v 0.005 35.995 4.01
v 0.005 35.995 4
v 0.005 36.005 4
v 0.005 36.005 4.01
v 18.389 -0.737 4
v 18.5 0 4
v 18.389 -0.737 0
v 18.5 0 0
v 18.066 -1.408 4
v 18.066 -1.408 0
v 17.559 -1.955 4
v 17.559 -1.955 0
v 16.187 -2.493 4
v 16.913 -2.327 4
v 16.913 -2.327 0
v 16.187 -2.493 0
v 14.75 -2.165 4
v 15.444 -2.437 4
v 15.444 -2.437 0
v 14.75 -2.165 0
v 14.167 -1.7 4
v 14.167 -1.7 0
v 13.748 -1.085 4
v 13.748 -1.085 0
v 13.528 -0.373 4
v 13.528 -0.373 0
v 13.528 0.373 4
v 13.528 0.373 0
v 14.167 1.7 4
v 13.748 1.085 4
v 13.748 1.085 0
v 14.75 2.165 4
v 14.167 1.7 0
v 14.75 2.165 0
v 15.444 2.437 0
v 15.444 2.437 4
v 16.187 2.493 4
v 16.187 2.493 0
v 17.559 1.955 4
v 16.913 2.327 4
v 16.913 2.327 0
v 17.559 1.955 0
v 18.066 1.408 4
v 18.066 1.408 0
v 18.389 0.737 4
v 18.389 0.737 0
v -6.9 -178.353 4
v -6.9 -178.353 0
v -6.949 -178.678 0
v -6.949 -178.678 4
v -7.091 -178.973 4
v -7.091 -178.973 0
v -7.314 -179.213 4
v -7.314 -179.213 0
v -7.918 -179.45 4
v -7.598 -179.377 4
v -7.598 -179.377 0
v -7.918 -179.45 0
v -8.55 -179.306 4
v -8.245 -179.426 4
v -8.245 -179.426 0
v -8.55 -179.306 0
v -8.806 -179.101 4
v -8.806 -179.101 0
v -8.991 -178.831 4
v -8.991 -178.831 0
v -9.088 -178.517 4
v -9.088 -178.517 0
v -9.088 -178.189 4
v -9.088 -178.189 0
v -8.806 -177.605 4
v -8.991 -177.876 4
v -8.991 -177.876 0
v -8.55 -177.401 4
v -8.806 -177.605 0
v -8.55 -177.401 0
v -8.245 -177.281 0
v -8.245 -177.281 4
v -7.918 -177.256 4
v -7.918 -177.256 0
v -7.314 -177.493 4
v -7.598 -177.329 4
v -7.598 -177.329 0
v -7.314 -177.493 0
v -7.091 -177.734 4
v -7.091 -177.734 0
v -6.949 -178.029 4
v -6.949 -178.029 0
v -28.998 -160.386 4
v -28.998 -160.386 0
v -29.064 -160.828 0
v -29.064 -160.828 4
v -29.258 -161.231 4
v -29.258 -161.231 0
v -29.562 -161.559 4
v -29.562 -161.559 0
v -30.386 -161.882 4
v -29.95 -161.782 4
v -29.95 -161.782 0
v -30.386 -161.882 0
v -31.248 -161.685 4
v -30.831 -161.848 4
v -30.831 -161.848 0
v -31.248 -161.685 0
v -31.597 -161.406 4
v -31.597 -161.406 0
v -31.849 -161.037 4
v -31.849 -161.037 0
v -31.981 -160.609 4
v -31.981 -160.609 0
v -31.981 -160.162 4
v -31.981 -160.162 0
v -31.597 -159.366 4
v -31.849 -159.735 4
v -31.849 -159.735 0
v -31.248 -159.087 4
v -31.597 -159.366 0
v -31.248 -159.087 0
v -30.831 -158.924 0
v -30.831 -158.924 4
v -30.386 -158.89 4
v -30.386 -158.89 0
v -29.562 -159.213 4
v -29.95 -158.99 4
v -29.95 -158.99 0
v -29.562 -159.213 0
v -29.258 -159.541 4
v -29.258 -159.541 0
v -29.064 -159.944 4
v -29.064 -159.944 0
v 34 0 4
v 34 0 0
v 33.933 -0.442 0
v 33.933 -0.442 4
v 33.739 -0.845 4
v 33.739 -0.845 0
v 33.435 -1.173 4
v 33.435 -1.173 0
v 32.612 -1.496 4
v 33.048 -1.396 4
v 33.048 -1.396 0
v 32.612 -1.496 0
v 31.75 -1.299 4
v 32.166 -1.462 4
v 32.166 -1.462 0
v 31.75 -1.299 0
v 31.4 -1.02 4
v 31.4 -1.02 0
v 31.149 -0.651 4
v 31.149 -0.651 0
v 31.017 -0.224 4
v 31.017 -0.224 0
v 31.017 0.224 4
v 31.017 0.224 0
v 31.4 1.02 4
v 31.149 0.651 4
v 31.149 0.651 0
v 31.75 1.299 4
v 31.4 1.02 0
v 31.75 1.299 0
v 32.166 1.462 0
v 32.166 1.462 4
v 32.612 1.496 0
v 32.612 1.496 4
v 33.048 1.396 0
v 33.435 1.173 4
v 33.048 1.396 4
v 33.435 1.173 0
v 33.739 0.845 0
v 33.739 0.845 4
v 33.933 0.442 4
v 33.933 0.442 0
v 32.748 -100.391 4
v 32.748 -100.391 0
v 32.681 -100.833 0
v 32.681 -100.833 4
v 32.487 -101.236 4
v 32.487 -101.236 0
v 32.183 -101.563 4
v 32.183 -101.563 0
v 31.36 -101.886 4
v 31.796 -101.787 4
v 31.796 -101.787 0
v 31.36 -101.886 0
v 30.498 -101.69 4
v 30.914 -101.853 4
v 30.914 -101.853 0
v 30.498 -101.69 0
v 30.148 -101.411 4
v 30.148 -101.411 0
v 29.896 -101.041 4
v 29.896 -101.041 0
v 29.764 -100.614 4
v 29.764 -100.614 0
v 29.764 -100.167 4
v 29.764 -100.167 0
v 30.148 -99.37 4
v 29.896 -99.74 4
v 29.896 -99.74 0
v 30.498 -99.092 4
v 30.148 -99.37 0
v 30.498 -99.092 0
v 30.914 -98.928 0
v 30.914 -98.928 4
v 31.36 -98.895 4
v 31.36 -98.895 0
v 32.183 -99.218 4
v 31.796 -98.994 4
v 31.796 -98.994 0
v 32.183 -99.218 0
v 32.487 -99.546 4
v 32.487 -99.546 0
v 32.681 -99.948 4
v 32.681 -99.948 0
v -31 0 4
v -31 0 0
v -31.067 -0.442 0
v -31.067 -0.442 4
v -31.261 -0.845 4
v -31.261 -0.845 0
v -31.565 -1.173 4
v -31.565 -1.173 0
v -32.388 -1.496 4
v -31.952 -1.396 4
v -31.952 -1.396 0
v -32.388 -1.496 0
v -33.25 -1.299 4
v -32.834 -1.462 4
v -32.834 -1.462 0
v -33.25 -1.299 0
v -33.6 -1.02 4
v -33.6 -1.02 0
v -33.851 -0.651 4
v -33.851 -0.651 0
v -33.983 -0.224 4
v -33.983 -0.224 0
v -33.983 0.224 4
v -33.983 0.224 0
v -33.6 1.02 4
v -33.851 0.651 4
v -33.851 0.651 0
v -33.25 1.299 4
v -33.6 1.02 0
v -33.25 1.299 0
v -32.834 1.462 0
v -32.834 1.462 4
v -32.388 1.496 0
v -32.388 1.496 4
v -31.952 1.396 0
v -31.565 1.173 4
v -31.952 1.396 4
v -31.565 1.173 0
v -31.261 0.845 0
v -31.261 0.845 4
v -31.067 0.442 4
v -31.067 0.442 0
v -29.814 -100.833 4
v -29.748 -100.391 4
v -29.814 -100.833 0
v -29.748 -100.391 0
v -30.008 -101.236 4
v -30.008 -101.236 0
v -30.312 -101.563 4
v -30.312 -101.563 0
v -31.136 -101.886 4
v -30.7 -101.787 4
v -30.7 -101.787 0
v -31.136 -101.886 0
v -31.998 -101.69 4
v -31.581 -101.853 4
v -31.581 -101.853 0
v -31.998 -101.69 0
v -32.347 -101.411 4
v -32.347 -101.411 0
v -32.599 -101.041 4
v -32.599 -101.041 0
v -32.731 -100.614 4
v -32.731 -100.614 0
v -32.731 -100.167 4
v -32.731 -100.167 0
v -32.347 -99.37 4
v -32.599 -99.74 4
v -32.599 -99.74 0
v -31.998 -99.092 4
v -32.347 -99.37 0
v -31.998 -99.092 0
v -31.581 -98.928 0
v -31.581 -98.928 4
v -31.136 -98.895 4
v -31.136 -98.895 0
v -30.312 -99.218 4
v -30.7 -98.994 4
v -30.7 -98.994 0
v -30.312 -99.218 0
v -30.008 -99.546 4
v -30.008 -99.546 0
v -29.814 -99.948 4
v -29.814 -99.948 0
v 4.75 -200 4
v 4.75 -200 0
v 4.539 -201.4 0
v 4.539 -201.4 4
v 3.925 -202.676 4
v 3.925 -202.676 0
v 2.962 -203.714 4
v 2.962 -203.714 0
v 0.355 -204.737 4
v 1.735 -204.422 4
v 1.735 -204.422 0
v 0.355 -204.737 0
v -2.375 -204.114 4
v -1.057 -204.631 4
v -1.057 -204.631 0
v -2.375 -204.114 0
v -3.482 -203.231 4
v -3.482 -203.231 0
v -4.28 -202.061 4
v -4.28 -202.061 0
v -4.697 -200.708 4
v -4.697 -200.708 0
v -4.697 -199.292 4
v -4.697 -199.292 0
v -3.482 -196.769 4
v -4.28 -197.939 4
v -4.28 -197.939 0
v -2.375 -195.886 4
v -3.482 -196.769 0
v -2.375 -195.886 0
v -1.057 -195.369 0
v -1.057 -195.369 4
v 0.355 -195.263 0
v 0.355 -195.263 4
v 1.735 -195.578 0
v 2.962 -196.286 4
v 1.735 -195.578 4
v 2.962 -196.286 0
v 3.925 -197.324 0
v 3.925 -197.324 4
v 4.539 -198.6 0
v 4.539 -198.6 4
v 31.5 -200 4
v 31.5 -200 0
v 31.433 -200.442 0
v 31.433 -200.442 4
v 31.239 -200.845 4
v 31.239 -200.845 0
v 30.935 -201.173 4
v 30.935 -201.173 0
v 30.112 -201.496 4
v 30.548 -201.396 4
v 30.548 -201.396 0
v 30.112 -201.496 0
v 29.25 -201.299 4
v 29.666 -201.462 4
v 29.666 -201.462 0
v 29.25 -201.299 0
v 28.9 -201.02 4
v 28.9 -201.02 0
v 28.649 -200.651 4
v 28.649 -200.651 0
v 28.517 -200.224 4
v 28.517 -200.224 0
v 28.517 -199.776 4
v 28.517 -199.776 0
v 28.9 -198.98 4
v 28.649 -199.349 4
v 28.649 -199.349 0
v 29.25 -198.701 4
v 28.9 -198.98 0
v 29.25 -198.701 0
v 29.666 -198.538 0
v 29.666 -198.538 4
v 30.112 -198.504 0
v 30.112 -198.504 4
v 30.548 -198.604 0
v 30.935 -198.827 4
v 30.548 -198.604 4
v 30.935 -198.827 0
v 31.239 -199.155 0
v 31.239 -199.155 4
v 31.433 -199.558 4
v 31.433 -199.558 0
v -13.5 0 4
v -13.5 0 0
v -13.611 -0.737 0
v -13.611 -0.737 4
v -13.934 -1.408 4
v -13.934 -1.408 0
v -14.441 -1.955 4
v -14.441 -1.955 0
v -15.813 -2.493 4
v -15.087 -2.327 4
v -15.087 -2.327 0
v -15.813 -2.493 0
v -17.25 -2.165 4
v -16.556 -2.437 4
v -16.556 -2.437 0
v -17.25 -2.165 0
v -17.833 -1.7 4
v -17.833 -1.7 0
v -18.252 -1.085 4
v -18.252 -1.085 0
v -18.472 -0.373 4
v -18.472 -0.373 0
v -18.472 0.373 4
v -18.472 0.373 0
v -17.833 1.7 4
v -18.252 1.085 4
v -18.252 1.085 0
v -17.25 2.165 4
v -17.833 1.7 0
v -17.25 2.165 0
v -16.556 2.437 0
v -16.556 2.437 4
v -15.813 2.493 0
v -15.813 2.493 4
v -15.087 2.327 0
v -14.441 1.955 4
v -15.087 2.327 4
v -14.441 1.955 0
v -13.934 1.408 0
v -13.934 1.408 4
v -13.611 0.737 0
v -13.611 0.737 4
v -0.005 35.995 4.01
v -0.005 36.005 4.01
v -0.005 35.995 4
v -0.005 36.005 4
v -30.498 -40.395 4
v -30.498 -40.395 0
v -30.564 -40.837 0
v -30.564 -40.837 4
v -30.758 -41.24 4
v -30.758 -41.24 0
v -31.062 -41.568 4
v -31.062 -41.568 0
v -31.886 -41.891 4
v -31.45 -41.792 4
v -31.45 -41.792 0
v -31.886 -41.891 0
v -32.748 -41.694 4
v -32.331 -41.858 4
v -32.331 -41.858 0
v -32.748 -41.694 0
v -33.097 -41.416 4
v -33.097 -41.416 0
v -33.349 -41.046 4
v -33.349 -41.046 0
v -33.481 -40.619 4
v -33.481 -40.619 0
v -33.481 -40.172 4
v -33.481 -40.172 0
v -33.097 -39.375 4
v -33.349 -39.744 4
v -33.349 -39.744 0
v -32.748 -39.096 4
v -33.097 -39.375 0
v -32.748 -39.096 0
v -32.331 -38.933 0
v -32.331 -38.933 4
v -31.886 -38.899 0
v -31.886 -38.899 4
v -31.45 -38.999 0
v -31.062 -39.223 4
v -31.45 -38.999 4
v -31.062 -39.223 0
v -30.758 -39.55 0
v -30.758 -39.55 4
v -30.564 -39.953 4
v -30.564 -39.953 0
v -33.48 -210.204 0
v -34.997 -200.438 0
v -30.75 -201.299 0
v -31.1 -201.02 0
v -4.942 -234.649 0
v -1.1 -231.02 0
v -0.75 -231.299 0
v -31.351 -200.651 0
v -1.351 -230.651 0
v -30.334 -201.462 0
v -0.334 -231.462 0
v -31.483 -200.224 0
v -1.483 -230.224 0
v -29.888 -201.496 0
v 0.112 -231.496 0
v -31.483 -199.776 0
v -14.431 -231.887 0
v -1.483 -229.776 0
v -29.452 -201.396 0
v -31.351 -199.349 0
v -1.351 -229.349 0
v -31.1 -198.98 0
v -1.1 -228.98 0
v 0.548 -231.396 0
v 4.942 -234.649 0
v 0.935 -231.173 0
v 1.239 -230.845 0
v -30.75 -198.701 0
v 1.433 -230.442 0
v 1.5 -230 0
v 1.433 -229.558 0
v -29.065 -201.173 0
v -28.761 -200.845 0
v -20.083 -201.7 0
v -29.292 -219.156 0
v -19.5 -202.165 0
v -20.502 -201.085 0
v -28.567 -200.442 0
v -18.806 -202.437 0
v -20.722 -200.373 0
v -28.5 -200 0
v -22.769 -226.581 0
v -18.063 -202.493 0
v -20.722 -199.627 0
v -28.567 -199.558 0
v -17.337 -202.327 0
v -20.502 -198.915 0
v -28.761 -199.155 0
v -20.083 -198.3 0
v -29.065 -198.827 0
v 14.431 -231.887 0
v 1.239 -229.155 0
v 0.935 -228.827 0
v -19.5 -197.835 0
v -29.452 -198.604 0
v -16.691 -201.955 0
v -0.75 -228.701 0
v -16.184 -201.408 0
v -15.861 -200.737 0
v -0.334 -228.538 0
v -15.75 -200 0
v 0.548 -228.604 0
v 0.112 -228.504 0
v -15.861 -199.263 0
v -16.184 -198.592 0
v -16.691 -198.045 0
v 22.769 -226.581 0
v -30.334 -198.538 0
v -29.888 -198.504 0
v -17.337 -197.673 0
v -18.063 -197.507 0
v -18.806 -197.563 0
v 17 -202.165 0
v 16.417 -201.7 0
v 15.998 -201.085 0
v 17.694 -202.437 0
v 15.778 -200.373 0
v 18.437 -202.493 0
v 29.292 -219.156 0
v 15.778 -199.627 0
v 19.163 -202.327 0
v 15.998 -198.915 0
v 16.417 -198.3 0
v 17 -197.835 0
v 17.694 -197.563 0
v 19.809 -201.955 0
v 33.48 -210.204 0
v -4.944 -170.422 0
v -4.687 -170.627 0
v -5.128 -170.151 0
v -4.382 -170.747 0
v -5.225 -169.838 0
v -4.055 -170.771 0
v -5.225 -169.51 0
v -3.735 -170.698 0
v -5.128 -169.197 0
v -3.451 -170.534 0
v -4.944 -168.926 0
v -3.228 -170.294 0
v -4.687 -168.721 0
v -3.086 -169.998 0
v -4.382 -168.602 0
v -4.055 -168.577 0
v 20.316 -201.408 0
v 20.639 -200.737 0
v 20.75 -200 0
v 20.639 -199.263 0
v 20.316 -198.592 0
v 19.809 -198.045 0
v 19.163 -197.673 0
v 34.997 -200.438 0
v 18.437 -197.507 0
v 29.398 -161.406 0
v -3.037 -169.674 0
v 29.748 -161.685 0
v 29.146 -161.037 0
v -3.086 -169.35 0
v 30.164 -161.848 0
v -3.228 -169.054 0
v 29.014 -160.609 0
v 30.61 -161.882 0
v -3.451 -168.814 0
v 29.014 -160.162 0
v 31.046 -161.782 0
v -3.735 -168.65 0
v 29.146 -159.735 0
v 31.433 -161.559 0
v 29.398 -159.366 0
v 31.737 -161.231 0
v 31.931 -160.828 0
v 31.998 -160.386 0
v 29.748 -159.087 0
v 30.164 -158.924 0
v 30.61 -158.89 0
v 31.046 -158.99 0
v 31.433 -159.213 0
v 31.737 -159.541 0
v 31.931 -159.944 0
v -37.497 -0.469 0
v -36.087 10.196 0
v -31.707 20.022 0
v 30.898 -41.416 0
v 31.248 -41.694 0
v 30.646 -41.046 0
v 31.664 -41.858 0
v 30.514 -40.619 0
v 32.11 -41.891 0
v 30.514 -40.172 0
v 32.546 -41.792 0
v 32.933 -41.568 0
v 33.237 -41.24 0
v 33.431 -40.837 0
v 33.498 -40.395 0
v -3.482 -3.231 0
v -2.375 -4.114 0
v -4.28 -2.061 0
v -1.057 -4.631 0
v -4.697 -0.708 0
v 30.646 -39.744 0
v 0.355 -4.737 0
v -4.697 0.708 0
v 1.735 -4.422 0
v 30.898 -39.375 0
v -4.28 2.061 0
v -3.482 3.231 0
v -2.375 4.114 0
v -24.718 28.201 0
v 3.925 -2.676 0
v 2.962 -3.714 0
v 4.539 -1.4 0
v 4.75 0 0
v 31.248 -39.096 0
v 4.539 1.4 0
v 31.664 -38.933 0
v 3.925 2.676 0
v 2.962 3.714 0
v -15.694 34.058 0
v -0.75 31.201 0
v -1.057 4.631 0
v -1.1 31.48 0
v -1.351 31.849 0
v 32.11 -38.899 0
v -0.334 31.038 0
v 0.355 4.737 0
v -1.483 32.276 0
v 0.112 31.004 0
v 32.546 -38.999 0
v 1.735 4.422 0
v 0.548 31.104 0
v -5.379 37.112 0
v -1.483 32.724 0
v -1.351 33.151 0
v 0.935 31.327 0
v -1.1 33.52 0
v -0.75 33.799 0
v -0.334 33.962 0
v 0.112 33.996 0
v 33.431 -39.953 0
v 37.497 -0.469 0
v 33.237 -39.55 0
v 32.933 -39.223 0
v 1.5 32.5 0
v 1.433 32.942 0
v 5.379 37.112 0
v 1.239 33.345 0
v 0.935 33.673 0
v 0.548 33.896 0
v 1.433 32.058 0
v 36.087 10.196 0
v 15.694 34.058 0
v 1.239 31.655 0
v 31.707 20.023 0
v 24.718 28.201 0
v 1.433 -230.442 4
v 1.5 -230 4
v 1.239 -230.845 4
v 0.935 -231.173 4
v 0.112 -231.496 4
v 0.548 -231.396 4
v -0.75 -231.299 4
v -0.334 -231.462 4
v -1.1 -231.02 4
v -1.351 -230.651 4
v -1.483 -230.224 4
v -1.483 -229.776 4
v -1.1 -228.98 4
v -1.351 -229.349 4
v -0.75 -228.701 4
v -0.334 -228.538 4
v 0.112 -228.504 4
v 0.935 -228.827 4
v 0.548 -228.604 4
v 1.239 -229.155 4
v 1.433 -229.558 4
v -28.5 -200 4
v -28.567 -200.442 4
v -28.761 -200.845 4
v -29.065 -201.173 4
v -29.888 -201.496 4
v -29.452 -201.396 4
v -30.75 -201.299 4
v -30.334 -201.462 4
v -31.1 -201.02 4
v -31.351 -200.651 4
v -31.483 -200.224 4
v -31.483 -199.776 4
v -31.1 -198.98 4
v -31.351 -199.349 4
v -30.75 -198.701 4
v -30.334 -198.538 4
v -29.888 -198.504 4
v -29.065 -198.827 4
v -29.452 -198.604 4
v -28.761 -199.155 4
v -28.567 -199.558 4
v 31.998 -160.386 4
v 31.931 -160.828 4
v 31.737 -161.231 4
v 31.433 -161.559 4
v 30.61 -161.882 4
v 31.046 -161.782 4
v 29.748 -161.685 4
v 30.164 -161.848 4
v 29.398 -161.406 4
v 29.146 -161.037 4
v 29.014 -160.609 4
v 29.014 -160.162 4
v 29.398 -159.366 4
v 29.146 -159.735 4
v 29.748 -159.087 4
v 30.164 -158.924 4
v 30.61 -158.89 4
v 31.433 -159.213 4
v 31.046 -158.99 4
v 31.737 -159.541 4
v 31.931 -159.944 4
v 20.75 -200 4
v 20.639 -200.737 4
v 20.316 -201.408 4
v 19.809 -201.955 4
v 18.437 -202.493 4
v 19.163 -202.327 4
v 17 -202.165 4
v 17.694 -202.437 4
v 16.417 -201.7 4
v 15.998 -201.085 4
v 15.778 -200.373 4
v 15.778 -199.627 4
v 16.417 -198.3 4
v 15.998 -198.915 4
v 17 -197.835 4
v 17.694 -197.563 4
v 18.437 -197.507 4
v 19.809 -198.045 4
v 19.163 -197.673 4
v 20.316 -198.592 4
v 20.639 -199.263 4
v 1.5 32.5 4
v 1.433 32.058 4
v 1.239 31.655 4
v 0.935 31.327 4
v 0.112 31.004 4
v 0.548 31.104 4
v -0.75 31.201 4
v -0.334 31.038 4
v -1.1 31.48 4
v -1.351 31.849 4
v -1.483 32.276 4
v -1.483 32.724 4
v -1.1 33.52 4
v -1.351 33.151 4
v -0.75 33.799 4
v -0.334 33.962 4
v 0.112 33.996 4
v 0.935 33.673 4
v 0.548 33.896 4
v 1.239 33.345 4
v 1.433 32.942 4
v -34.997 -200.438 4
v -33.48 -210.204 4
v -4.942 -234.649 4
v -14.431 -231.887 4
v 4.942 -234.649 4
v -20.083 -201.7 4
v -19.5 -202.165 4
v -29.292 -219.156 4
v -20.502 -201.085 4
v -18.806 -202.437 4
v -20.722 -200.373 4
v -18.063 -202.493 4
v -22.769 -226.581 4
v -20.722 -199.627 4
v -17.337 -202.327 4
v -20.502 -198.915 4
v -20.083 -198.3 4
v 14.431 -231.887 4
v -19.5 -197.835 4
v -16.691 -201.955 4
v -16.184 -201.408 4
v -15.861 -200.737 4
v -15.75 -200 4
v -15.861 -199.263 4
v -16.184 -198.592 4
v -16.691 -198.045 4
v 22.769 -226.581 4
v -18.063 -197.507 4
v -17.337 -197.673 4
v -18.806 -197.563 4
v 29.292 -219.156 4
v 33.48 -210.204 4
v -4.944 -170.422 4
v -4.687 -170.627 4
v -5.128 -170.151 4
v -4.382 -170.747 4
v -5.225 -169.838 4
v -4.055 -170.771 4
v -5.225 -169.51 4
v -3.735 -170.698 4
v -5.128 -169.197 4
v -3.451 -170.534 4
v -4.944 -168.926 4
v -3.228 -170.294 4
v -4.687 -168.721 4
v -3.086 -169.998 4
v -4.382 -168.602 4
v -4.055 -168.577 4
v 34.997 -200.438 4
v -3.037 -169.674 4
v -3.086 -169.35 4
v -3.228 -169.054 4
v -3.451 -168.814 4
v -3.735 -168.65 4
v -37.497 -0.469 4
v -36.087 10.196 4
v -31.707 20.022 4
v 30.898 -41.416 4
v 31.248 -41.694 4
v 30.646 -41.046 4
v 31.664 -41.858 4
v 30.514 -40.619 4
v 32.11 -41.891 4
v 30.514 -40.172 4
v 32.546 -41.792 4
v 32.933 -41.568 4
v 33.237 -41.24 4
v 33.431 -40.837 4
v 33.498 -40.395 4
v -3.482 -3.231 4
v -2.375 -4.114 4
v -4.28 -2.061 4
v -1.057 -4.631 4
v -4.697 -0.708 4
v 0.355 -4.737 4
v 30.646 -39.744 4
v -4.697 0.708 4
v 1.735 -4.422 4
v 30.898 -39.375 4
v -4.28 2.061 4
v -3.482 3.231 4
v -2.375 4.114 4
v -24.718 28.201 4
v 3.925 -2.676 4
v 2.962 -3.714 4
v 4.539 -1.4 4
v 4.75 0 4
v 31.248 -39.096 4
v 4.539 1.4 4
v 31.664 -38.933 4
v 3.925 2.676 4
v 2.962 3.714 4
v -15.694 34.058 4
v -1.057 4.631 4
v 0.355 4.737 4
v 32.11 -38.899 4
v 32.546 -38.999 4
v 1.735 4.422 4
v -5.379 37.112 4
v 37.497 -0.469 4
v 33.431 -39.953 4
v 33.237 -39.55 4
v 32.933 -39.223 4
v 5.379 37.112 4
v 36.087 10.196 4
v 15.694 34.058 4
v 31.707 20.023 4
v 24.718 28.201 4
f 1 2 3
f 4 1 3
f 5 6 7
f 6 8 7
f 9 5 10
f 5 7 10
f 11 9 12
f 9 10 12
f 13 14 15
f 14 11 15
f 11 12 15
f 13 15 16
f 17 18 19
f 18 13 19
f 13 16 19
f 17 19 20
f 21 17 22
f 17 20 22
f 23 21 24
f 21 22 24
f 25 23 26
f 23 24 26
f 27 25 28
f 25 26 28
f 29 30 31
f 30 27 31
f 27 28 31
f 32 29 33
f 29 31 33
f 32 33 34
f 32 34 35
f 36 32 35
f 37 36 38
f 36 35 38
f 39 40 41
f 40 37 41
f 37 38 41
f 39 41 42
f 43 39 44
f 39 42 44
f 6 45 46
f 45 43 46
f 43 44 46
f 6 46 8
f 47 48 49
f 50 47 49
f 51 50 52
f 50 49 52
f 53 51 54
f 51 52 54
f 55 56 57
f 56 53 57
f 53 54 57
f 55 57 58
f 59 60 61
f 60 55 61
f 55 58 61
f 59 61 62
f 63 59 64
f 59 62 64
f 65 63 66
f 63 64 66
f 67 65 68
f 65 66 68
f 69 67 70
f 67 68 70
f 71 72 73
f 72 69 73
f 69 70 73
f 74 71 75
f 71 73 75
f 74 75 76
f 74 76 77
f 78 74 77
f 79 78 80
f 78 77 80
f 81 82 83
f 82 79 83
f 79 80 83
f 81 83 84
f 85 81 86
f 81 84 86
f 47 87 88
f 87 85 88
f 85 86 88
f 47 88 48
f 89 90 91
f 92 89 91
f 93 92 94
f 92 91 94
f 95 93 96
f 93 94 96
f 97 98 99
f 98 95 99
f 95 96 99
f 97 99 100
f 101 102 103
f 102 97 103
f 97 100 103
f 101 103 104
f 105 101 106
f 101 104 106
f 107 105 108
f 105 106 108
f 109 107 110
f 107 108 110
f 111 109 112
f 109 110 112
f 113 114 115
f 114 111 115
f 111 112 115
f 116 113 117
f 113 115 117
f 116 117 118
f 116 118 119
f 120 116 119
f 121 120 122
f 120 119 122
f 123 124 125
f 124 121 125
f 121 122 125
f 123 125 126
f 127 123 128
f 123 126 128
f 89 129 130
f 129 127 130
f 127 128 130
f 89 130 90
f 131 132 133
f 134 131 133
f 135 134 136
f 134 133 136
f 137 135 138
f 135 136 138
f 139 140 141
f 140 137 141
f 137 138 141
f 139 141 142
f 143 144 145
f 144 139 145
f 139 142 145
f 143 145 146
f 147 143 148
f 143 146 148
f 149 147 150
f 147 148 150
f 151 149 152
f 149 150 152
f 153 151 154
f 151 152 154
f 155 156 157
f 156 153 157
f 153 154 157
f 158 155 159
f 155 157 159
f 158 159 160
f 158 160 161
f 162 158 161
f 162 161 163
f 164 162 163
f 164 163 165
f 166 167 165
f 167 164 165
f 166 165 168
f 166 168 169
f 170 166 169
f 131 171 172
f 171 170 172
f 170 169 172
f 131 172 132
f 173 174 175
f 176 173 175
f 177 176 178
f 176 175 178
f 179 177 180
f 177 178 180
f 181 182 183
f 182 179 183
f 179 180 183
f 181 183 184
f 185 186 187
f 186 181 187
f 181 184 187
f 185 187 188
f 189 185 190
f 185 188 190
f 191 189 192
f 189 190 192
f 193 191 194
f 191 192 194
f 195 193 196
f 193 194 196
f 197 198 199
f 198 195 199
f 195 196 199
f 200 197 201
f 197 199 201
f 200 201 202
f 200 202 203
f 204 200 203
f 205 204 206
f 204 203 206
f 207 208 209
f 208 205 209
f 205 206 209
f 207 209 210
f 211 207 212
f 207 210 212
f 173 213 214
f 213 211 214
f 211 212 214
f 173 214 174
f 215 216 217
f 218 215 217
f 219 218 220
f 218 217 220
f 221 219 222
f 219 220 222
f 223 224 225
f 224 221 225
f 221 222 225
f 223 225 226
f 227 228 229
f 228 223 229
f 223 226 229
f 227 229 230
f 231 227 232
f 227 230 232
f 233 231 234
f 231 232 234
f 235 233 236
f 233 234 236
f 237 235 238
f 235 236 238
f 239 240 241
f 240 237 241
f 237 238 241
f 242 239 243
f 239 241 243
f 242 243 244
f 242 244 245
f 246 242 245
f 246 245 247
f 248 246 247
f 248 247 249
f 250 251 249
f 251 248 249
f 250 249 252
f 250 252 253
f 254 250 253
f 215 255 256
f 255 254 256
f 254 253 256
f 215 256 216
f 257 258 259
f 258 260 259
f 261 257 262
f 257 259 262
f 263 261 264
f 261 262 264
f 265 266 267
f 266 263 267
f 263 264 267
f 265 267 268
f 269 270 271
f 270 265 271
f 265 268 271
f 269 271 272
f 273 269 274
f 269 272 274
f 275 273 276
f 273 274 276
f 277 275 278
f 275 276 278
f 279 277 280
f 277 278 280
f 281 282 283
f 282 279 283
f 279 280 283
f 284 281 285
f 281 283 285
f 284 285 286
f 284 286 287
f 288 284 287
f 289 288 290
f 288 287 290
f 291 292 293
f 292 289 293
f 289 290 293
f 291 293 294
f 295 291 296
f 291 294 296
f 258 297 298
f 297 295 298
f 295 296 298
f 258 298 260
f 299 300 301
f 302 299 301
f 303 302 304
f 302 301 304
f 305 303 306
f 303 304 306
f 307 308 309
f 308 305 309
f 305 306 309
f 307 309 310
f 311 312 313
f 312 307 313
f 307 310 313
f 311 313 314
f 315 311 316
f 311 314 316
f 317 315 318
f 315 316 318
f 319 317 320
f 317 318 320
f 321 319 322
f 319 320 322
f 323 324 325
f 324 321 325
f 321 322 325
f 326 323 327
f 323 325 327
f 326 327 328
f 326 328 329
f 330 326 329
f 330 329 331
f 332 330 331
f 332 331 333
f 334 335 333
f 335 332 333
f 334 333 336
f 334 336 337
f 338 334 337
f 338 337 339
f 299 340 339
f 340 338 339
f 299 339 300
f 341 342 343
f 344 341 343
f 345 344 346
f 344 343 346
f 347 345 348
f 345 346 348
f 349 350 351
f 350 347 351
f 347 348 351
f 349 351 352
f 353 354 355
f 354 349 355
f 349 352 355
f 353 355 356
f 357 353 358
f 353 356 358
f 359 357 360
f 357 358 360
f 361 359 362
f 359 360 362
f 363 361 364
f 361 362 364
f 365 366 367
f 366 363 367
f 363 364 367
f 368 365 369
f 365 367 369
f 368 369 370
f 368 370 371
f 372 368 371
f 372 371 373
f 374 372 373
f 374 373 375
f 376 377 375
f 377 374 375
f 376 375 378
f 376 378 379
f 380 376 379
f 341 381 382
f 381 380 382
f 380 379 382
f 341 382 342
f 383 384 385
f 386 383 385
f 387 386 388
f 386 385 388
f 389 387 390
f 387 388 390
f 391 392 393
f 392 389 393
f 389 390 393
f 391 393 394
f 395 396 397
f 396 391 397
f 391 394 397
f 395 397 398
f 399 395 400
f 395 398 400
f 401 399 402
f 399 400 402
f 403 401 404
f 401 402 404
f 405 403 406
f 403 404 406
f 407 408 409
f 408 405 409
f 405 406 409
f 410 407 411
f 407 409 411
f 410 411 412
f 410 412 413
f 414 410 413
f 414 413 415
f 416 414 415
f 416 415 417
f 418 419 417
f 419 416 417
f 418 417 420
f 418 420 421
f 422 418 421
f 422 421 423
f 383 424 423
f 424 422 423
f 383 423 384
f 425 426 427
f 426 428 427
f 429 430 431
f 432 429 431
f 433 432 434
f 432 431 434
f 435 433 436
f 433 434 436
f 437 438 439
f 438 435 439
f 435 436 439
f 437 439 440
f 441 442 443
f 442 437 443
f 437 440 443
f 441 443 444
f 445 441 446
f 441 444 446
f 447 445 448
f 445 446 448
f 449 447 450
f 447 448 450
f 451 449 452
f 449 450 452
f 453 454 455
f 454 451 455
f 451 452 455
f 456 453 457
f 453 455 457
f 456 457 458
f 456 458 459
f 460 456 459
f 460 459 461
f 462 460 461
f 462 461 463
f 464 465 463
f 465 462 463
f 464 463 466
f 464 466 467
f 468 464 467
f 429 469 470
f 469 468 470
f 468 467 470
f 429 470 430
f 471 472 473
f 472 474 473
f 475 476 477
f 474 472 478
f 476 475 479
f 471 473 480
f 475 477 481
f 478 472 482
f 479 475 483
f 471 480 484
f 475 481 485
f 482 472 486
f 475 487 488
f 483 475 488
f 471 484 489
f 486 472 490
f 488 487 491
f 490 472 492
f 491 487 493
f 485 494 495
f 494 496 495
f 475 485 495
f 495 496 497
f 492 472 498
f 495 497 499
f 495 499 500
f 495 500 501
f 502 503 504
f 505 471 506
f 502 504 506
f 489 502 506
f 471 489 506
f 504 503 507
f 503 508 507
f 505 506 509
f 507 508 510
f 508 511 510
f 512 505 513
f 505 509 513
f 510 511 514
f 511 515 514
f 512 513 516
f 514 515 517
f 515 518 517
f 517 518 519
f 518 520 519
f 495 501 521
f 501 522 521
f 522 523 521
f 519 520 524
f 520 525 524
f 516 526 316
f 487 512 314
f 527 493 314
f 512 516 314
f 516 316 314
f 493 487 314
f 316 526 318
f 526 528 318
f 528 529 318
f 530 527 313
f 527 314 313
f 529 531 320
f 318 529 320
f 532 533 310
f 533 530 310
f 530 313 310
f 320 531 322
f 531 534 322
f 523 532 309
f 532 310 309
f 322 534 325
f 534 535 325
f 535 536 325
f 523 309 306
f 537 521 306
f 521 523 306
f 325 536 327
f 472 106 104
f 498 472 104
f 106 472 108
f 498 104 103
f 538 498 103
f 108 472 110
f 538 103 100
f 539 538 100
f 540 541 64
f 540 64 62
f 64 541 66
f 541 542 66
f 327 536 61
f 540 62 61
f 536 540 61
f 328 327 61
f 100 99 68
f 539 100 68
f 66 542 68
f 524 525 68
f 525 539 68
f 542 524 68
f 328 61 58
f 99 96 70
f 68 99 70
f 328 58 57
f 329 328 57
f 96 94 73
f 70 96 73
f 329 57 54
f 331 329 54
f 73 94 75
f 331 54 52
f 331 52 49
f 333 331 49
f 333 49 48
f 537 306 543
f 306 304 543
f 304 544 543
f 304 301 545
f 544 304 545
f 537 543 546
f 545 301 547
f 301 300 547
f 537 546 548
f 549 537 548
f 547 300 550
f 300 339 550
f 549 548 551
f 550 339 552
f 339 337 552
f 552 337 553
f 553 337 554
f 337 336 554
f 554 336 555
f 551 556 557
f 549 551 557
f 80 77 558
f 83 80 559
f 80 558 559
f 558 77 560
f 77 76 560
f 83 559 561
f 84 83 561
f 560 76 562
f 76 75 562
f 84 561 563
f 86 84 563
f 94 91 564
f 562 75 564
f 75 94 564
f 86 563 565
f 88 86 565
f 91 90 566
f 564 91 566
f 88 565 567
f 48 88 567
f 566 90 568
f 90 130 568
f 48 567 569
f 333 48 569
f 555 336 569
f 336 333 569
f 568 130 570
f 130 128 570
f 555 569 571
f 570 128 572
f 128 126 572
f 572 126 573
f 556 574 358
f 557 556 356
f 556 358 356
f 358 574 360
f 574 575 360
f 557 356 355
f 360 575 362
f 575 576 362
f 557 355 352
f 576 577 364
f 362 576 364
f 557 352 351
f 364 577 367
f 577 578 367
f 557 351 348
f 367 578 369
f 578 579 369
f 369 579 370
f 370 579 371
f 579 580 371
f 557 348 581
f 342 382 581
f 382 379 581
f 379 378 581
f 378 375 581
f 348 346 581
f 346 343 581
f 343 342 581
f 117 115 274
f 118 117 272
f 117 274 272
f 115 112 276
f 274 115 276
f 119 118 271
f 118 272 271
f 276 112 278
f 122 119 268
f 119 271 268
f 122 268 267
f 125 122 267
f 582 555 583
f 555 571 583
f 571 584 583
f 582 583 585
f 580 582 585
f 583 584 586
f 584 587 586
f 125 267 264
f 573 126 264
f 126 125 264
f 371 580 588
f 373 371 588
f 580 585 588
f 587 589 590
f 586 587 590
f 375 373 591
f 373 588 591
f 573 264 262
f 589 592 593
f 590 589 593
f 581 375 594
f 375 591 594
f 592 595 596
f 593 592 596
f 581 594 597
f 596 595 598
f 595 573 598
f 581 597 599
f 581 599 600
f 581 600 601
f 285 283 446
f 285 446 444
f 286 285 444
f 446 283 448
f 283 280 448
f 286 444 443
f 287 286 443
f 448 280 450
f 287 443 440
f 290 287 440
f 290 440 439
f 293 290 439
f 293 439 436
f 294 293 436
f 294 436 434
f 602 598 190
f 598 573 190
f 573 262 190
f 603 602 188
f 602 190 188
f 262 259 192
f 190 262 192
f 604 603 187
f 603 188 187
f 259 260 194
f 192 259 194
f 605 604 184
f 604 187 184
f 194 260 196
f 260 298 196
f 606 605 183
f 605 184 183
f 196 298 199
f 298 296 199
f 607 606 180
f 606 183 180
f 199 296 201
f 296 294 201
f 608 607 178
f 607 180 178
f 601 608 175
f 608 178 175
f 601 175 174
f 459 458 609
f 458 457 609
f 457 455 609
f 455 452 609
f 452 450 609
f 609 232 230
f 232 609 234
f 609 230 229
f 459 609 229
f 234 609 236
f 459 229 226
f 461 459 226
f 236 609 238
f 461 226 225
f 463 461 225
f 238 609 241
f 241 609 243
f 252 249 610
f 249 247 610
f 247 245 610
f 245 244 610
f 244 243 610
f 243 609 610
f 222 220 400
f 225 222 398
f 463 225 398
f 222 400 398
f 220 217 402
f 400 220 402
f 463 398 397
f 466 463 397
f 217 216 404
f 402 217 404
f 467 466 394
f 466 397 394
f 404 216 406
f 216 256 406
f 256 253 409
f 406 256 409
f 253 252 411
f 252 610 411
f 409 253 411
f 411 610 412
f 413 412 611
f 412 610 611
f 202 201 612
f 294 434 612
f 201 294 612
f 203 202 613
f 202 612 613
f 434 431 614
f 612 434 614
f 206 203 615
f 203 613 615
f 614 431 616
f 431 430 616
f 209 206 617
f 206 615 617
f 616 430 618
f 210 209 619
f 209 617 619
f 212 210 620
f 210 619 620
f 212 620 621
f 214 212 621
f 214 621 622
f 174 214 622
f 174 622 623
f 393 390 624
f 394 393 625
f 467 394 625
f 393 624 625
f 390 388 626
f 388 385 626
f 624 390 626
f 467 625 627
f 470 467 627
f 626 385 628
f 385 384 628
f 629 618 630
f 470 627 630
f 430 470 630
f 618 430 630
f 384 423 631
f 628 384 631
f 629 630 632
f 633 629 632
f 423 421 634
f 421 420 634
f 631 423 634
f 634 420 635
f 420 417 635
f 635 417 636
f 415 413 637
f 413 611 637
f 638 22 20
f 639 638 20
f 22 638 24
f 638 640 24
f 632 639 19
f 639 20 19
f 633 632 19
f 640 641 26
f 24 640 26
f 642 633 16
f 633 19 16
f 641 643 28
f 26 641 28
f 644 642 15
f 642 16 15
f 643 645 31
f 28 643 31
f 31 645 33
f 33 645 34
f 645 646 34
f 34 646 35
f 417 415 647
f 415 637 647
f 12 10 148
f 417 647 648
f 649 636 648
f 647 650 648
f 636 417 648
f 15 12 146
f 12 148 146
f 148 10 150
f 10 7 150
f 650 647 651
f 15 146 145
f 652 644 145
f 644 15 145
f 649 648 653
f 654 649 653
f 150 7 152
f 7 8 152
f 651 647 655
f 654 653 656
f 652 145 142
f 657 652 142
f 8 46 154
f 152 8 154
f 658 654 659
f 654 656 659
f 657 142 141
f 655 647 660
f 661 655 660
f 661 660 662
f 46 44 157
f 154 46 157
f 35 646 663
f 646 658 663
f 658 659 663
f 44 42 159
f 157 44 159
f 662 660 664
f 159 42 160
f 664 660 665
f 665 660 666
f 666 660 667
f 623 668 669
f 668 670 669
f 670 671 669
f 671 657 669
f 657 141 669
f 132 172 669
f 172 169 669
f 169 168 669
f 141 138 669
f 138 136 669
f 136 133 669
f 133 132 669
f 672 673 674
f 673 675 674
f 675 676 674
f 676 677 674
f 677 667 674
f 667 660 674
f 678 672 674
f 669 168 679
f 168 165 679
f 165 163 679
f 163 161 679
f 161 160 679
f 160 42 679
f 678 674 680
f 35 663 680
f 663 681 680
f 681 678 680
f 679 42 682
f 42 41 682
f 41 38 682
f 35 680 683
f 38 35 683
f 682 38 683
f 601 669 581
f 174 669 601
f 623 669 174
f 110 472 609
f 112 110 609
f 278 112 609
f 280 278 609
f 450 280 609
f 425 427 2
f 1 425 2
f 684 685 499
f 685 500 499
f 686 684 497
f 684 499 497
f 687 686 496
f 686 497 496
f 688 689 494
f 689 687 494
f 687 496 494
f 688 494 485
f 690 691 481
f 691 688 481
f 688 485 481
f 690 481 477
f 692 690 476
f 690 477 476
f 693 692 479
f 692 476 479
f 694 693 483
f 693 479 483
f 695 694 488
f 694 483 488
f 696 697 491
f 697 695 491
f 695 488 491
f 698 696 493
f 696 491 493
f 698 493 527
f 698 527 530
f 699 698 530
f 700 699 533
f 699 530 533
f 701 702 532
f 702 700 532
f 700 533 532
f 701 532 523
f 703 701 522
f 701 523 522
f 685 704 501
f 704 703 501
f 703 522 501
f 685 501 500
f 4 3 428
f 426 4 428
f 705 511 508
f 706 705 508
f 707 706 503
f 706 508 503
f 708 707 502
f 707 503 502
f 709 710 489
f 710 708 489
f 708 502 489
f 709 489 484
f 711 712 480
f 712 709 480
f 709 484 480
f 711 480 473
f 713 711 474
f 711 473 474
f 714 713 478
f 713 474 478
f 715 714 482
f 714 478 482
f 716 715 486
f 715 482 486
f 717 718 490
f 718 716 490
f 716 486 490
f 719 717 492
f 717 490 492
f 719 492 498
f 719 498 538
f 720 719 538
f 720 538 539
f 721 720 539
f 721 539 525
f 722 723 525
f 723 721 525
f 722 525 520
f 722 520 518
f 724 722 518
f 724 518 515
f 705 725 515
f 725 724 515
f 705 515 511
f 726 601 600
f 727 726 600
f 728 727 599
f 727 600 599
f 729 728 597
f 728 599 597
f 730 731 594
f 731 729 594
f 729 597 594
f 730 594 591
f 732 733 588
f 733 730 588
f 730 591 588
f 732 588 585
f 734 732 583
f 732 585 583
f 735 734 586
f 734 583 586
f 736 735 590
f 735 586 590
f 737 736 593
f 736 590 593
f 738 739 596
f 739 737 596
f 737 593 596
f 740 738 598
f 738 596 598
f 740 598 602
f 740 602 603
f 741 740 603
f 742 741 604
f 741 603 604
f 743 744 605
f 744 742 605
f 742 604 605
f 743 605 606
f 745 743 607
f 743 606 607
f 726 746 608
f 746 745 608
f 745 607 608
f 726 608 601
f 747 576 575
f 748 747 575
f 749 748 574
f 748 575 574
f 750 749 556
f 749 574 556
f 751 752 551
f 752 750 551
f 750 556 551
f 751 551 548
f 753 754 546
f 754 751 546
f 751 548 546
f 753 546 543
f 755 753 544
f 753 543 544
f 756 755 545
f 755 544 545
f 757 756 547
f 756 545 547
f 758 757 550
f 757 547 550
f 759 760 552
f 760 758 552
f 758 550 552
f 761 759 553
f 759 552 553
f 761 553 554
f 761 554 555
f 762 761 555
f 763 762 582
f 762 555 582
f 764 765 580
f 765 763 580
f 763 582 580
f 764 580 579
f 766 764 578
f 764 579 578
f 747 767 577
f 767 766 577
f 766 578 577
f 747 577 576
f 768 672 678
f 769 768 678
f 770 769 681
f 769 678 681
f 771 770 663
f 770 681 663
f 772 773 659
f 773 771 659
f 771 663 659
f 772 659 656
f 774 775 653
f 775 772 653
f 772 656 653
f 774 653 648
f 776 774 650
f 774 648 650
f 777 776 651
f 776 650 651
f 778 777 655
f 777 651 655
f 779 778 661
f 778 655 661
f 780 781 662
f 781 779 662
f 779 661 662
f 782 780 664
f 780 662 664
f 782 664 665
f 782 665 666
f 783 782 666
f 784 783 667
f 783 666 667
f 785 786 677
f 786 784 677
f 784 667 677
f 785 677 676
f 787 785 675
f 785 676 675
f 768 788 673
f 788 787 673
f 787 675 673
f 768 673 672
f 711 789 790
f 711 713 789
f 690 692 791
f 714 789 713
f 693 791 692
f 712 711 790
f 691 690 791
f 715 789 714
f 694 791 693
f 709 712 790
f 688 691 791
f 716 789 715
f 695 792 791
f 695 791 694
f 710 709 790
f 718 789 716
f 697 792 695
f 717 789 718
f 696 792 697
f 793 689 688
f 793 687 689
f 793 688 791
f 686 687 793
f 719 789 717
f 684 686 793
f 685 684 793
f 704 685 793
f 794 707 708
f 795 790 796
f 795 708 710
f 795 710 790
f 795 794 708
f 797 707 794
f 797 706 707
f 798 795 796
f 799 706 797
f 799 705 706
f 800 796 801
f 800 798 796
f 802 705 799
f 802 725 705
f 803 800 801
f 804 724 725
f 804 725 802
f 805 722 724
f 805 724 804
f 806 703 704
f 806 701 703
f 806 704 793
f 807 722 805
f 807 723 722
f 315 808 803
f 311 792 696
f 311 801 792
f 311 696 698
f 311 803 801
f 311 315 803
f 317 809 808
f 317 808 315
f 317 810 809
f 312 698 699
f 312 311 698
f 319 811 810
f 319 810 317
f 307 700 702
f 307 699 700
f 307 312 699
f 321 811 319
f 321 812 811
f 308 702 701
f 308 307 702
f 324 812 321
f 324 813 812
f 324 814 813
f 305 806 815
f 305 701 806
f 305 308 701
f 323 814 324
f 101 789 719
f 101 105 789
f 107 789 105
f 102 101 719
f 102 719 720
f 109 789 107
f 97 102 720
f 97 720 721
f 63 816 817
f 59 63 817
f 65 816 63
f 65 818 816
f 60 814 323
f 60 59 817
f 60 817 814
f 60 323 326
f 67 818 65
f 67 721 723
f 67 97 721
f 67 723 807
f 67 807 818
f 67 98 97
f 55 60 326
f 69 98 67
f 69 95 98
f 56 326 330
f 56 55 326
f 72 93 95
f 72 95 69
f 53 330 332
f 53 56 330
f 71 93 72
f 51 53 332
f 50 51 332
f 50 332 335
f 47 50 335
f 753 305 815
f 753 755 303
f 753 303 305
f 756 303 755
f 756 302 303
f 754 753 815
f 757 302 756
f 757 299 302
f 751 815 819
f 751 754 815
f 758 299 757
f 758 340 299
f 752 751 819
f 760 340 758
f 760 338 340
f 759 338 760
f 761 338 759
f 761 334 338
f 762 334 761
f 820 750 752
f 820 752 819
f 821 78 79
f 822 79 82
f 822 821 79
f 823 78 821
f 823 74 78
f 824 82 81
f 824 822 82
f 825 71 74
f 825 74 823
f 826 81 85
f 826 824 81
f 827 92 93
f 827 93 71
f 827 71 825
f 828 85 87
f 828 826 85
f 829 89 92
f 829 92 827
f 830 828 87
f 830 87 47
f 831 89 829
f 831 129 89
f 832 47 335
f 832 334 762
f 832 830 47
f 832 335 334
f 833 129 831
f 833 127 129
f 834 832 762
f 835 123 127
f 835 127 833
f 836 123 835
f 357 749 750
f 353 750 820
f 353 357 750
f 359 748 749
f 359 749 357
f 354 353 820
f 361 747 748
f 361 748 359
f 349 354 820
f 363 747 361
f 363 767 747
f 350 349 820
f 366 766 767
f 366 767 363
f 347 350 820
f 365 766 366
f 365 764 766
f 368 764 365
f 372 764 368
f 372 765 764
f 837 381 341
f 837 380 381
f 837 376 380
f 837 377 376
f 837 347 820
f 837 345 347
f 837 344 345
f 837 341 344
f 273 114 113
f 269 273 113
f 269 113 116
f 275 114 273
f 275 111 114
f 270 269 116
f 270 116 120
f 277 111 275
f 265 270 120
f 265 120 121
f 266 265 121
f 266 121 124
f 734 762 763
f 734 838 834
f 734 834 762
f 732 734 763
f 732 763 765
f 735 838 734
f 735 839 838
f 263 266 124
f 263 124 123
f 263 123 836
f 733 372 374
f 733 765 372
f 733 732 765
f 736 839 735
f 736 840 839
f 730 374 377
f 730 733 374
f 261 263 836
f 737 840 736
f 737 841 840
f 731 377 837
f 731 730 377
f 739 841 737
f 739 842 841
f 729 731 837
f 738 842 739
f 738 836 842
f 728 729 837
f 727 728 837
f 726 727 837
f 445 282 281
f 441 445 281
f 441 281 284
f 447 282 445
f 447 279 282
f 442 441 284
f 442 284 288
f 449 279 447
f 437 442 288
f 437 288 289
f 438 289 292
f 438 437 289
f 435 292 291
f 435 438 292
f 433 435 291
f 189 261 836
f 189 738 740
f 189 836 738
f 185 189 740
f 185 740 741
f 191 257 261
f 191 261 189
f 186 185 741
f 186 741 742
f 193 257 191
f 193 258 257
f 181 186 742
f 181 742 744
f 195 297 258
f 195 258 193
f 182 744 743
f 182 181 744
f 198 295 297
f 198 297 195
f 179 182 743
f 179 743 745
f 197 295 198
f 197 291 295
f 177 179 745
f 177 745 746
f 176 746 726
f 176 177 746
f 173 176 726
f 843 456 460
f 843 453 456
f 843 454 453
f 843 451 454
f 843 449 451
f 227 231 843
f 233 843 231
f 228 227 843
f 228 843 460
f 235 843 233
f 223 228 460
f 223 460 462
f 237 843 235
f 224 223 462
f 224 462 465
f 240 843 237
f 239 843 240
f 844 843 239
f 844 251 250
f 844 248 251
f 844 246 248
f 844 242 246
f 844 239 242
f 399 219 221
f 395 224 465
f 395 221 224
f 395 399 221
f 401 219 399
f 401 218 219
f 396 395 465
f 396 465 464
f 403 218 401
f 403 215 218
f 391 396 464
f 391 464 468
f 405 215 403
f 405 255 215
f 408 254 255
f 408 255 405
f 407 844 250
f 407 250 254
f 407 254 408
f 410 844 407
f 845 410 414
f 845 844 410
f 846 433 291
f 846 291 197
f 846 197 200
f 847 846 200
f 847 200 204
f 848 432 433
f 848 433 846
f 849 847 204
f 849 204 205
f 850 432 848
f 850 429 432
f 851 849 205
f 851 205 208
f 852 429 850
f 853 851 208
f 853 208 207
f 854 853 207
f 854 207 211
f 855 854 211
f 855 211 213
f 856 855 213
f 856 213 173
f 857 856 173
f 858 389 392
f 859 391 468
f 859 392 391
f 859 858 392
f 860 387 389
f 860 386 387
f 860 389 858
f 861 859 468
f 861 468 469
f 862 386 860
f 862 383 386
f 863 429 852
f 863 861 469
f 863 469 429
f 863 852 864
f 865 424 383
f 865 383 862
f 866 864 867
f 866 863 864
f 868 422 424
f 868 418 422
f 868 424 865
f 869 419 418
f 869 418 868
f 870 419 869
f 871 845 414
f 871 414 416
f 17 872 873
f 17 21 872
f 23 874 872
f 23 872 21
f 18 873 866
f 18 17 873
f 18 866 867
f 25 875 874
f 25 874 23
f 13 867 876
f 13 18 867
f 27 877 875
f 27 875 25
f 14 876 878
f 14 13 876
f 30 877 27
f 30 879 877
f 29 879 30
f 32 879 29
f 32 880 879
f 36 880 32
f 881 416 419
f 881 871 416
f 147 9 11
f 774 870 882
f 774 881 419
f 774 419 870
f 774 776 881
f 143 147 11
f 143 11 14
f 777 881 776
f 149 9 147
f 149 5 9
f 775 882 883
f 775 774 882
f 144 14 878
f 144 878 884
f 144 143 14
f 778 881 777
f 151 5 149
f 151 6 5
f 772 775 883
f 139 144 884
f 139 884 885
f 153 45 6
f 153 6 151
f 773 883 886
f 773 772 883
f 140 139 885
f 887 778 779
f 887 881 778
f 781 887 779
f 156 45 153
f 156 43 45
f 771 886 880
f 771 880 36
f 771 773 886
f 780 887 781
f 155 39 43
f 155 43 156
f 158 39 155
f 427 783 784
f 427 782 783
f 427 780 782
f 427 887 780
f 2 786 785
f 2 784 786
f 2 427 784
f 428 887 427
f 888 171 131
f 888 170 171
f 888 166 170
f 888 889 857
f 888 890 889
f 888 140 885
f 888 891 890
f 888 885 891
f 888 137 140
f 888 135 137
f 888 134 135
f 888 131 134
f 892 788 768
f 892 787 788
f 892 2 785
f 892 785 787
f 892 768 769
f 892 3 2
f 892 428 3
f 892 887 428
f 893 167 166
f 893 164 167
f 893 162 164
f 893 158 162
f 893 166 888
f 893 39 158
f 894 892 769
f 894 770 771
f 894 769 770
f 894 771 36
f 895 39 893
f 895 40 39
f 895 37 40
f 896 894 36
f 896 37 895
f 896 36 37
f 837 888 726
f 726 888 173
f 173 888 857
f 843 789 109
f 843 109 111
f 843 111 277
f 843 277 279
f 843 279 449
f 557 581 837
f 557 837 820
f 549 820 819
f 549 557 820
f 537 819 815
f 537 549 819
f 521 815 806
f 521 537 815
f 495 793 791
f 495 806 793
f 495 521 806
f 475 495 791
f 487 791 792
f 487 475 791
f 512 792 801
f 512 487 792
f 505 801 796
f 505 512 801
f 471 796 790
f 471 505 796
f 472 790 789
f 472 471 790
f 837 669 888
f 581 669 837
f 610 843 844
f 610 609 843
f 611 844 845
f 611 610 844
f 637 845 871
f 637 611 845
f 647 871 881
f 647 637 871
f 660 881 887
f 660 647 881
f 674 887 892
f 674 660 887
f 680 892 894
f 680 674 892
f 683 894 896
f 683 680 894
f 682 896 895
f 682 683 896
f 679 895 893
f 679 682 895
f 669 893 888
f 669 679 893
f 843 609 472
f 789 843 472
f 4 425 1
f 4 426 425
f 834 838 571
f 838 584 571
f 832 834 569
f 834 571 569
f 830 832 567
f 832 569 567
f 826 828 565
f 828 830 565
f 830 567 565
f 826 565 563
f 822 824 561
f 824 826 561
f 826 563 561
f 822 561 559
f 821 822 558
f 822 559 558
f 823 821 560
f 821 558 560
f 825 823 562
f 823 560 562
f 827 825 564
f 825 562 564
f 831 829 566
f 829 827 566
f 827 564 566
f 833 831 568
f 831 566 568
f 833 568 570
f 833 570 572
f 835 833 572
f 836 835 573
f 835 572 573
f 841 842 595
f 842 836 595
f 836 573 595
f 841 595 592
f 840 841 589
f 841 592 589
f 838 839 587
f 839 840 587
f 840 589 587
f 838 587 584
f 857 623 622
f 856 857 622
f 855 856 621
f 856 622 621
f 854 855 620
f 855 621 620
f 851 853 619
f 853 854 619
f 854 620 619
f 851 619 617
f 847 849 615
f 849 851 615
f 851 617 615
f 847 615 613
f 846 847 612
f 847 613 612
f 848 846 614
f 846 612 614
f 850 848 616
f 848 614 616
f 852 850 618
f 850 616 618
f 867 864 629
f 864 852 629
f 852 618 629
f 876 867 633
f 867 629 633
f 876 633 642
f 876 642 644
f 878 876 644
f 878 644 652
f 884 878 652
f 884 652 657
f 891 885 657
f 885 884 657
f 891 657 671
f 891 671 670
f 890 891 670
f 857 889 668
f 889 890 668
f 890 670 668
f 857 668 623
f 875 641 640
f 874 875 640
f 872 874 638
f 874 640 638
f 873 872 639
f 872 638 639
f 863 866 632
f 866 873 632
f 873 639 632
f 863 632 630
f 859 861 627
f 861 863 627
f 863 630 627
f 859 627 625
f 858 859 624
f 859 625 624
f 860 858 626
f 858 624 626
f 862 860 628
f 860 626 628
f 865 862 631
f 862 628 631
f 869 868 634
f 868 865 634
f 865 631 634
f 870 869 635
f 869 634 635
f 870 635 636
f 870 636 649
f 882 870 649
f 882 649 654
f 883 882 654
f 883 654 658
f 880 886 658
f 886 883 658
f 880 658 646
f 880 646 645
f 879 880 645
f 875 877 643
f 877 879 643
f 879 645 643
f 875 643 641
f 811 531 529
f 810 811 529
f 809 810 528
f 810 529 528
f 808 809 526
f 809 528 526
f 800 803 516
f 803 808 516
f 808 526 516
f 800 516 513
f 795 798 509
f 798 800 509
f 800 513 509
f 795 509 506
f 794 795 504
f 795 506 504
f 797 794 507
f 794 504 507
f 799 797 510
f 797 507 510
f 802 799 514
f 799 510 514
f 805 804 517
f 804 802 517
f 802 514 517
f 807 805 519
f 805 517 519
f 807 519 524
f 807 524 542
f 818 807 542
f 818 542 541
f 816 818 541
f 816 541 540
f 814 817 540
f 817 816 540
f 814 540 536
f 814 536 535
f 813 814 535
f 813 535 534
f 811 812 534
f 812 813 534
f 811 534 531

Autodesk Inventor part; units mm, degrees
ref_plane "YZ Plane" through (0, 0, 0) normal (1, 0, 0) x (0, 1, 0)
ref_plane "XZ Plane" through (0, 0, 0) normal (0, 1, 0) x (-1, 0, 0)
ref_plane "XY Plane" through (0, 0, 0) normal (0, 0, 1) x (1, 0, 0)
sketch "Sketch1" plane through (0, 0, 0) normal (0, 0, 1) x (1, 0, 0)
  arc A0 (37.4971, -0.4687) -> (-37.4971, -0.4688) centre (0, 0) ccw
  line L0 (0, 0) -> (0, -200) construction
  arc A1 (-35, -200) -> (35, -200) centre (0, -200) ccw
  circle A2 centre (0, -200) radius 4.75
  circle A3 centre (0, 0) radius 4.75
  line L1 (0, -200) -> (18.25, -200) construction
  circle A4 centre (18.25, -200) radius 2.5
  circle A5 centre (0, -200) radius 21 construction
  line L2 (0, -235) -> (0, -230) construction
  circle A6 centre (0, -230) radius 1.5
  line L3 (37.4971, -0.4687) -> (34.9973, -200.4375)
  line L4 (-37.4971, -0.4688) -> (-34.9973, -200.4375)
  line L5 (36.2472, -100.4531) -> (31.2476, -100.3906) construction
  line L6 (30.4976, -160.3859) -> (31.9976, -40.3953) construction
  circle A7 centre (31.9976, -40.3953) radius 1.5
  circle A8 centre (31.2476, -100.3906) radius 1.5
  circle A9 centre (30.4976, -160.3859) radius 1.5
  line L7 (37.5, 0) -> (32.5, 0) construction
  line L8 (0, 37.5) -> (0, 32.5) construction
  circle A10 centre (0, 32.5) radius 1.5
  circle A11 centre (32.5, 0) radius 1.5
  line L9 (35, -200) -> (30, -200) construction
  circle A12 centre (30, -200) radius 1.5
  circle A13 centre (-31.9976, -40.3953) radius 1.5
  circle A14 centre (-31.2476, -100.3906) radius 1.5
  circle A15 centre (-30.4976, -160.3859) radius 1.5
  circle A16 centre (-32.5, 0) radius 1.5
  line L10 (-35, -200) -> (-30, -200) construction
  circle A17 centre (-30, -200) radius 1.5
  line L11 (0, 0) -> (16, 0) construction
  circle A18 centre (16, 0) radius 2.5
  line L12 (0, -200) -> (-18.25, -200) construction
  circle A19 centre (-18.25, -200) radius 2.5
  line L13 (0, 0) -> (-16, 0) construction
  circle A20 centre (-16, 0) radius 2.5
  line L14 (0, -200) -> (0, -60.58) construction
  line L15 (0, -200) -> (47.7906, -152.2094) construction
  line L16 (0, -200) -> (0, -182) construction
  circle A21 centre (-8, -178.3533) radius 1.1
  circle A22 centre (-4.1372, -169.6741) radius 1.1
  dimension "D_Junta2" = 75
  dimension "L_Elo" = 200
  dimension "D_Junta3" = 70
  dimension "Veio" = 9.5
  dimension "d4" = 9.5
  dimension "d5" = 18.25
  dimension "d6" = 5
  dimension "D_P" = 42
  dimension "LF" = 5
  dimension "D_Sup" = 3
  dimension "d10" = 5
  dimension "d12" = 120
  dimension "d13" = 3
  dimension "d14" = 3
  dimension "d15" = 3
  dimension "d16" = 5
  dimension "d17" = 5
  dimension "d18" = 3
  dimension "d19" = 3
  dimension "d20" = 5
  dimension "d21" = 3
  dimension "d22" = 16
  dimension "d23" = 5
  dimension "d26" = 139.42
  dimension "d33" = 135
  dimension "d34" = 18
  dimension "d35" = 2.2
  dimension "d36" = 2.2
  dimension "d37" = 9.5
  dimension "d41" = 8
  dimension "d42" = 4.1372
  dimension "d43" = 21.6467
extrude "Extrusion1" add sketch "Sketch1" along normal blind 4 contours L3 A1 L4 A0 | A21 | A22
sketch "Sketch2" plane through (0, 0, 4) normal (0, 0, 1) x (1, 0, 0)
  line L0 (0, 0) -> (0, 36)
  line L1 (-0.005, 35.995) -> (0.005, 35.995)
  line L2 (0.005, 35.995) -> (0.005, 36.005)
  line L3 (0.005, 36.005) -> (-0.005, 36.005)
  line L4 (-0.005, 36.005) -> (-0.005, 35.995)
  line L5 (-0.005, 35.995) -> (0.005, 36.005) construction
  line L6 (0.005, 35.995) -> (-0.005, 36.005) construction
  dimension "d28" = 36
  dimension "d29" = 0.01
  dimension "d30" = 0.01
extrude "Extrusion2" add sketch "Sketch2" along normal blind 0.01
extrude "Extrusion3" cut sketch "Sketch1" along normal up to surface (4 mm away) contours A21 | A22
equation "\"d4\" = Veio"
equation "\"d10\" = LF"
equation "\"d13\" = D_Sup"
equation "\"d14\" = D_Sup"
equation "\"d15\" = D_Sup"
equation "\"d16\" = LF"
equation "\"d17\" = LF"
equation "\"d18\" = D_Sup"
equation "\"d19\" = D_Sup"
equation "\"d20\" = LF"
equation "\"d21\" = D_Sup"
properties part number "4ELO"
